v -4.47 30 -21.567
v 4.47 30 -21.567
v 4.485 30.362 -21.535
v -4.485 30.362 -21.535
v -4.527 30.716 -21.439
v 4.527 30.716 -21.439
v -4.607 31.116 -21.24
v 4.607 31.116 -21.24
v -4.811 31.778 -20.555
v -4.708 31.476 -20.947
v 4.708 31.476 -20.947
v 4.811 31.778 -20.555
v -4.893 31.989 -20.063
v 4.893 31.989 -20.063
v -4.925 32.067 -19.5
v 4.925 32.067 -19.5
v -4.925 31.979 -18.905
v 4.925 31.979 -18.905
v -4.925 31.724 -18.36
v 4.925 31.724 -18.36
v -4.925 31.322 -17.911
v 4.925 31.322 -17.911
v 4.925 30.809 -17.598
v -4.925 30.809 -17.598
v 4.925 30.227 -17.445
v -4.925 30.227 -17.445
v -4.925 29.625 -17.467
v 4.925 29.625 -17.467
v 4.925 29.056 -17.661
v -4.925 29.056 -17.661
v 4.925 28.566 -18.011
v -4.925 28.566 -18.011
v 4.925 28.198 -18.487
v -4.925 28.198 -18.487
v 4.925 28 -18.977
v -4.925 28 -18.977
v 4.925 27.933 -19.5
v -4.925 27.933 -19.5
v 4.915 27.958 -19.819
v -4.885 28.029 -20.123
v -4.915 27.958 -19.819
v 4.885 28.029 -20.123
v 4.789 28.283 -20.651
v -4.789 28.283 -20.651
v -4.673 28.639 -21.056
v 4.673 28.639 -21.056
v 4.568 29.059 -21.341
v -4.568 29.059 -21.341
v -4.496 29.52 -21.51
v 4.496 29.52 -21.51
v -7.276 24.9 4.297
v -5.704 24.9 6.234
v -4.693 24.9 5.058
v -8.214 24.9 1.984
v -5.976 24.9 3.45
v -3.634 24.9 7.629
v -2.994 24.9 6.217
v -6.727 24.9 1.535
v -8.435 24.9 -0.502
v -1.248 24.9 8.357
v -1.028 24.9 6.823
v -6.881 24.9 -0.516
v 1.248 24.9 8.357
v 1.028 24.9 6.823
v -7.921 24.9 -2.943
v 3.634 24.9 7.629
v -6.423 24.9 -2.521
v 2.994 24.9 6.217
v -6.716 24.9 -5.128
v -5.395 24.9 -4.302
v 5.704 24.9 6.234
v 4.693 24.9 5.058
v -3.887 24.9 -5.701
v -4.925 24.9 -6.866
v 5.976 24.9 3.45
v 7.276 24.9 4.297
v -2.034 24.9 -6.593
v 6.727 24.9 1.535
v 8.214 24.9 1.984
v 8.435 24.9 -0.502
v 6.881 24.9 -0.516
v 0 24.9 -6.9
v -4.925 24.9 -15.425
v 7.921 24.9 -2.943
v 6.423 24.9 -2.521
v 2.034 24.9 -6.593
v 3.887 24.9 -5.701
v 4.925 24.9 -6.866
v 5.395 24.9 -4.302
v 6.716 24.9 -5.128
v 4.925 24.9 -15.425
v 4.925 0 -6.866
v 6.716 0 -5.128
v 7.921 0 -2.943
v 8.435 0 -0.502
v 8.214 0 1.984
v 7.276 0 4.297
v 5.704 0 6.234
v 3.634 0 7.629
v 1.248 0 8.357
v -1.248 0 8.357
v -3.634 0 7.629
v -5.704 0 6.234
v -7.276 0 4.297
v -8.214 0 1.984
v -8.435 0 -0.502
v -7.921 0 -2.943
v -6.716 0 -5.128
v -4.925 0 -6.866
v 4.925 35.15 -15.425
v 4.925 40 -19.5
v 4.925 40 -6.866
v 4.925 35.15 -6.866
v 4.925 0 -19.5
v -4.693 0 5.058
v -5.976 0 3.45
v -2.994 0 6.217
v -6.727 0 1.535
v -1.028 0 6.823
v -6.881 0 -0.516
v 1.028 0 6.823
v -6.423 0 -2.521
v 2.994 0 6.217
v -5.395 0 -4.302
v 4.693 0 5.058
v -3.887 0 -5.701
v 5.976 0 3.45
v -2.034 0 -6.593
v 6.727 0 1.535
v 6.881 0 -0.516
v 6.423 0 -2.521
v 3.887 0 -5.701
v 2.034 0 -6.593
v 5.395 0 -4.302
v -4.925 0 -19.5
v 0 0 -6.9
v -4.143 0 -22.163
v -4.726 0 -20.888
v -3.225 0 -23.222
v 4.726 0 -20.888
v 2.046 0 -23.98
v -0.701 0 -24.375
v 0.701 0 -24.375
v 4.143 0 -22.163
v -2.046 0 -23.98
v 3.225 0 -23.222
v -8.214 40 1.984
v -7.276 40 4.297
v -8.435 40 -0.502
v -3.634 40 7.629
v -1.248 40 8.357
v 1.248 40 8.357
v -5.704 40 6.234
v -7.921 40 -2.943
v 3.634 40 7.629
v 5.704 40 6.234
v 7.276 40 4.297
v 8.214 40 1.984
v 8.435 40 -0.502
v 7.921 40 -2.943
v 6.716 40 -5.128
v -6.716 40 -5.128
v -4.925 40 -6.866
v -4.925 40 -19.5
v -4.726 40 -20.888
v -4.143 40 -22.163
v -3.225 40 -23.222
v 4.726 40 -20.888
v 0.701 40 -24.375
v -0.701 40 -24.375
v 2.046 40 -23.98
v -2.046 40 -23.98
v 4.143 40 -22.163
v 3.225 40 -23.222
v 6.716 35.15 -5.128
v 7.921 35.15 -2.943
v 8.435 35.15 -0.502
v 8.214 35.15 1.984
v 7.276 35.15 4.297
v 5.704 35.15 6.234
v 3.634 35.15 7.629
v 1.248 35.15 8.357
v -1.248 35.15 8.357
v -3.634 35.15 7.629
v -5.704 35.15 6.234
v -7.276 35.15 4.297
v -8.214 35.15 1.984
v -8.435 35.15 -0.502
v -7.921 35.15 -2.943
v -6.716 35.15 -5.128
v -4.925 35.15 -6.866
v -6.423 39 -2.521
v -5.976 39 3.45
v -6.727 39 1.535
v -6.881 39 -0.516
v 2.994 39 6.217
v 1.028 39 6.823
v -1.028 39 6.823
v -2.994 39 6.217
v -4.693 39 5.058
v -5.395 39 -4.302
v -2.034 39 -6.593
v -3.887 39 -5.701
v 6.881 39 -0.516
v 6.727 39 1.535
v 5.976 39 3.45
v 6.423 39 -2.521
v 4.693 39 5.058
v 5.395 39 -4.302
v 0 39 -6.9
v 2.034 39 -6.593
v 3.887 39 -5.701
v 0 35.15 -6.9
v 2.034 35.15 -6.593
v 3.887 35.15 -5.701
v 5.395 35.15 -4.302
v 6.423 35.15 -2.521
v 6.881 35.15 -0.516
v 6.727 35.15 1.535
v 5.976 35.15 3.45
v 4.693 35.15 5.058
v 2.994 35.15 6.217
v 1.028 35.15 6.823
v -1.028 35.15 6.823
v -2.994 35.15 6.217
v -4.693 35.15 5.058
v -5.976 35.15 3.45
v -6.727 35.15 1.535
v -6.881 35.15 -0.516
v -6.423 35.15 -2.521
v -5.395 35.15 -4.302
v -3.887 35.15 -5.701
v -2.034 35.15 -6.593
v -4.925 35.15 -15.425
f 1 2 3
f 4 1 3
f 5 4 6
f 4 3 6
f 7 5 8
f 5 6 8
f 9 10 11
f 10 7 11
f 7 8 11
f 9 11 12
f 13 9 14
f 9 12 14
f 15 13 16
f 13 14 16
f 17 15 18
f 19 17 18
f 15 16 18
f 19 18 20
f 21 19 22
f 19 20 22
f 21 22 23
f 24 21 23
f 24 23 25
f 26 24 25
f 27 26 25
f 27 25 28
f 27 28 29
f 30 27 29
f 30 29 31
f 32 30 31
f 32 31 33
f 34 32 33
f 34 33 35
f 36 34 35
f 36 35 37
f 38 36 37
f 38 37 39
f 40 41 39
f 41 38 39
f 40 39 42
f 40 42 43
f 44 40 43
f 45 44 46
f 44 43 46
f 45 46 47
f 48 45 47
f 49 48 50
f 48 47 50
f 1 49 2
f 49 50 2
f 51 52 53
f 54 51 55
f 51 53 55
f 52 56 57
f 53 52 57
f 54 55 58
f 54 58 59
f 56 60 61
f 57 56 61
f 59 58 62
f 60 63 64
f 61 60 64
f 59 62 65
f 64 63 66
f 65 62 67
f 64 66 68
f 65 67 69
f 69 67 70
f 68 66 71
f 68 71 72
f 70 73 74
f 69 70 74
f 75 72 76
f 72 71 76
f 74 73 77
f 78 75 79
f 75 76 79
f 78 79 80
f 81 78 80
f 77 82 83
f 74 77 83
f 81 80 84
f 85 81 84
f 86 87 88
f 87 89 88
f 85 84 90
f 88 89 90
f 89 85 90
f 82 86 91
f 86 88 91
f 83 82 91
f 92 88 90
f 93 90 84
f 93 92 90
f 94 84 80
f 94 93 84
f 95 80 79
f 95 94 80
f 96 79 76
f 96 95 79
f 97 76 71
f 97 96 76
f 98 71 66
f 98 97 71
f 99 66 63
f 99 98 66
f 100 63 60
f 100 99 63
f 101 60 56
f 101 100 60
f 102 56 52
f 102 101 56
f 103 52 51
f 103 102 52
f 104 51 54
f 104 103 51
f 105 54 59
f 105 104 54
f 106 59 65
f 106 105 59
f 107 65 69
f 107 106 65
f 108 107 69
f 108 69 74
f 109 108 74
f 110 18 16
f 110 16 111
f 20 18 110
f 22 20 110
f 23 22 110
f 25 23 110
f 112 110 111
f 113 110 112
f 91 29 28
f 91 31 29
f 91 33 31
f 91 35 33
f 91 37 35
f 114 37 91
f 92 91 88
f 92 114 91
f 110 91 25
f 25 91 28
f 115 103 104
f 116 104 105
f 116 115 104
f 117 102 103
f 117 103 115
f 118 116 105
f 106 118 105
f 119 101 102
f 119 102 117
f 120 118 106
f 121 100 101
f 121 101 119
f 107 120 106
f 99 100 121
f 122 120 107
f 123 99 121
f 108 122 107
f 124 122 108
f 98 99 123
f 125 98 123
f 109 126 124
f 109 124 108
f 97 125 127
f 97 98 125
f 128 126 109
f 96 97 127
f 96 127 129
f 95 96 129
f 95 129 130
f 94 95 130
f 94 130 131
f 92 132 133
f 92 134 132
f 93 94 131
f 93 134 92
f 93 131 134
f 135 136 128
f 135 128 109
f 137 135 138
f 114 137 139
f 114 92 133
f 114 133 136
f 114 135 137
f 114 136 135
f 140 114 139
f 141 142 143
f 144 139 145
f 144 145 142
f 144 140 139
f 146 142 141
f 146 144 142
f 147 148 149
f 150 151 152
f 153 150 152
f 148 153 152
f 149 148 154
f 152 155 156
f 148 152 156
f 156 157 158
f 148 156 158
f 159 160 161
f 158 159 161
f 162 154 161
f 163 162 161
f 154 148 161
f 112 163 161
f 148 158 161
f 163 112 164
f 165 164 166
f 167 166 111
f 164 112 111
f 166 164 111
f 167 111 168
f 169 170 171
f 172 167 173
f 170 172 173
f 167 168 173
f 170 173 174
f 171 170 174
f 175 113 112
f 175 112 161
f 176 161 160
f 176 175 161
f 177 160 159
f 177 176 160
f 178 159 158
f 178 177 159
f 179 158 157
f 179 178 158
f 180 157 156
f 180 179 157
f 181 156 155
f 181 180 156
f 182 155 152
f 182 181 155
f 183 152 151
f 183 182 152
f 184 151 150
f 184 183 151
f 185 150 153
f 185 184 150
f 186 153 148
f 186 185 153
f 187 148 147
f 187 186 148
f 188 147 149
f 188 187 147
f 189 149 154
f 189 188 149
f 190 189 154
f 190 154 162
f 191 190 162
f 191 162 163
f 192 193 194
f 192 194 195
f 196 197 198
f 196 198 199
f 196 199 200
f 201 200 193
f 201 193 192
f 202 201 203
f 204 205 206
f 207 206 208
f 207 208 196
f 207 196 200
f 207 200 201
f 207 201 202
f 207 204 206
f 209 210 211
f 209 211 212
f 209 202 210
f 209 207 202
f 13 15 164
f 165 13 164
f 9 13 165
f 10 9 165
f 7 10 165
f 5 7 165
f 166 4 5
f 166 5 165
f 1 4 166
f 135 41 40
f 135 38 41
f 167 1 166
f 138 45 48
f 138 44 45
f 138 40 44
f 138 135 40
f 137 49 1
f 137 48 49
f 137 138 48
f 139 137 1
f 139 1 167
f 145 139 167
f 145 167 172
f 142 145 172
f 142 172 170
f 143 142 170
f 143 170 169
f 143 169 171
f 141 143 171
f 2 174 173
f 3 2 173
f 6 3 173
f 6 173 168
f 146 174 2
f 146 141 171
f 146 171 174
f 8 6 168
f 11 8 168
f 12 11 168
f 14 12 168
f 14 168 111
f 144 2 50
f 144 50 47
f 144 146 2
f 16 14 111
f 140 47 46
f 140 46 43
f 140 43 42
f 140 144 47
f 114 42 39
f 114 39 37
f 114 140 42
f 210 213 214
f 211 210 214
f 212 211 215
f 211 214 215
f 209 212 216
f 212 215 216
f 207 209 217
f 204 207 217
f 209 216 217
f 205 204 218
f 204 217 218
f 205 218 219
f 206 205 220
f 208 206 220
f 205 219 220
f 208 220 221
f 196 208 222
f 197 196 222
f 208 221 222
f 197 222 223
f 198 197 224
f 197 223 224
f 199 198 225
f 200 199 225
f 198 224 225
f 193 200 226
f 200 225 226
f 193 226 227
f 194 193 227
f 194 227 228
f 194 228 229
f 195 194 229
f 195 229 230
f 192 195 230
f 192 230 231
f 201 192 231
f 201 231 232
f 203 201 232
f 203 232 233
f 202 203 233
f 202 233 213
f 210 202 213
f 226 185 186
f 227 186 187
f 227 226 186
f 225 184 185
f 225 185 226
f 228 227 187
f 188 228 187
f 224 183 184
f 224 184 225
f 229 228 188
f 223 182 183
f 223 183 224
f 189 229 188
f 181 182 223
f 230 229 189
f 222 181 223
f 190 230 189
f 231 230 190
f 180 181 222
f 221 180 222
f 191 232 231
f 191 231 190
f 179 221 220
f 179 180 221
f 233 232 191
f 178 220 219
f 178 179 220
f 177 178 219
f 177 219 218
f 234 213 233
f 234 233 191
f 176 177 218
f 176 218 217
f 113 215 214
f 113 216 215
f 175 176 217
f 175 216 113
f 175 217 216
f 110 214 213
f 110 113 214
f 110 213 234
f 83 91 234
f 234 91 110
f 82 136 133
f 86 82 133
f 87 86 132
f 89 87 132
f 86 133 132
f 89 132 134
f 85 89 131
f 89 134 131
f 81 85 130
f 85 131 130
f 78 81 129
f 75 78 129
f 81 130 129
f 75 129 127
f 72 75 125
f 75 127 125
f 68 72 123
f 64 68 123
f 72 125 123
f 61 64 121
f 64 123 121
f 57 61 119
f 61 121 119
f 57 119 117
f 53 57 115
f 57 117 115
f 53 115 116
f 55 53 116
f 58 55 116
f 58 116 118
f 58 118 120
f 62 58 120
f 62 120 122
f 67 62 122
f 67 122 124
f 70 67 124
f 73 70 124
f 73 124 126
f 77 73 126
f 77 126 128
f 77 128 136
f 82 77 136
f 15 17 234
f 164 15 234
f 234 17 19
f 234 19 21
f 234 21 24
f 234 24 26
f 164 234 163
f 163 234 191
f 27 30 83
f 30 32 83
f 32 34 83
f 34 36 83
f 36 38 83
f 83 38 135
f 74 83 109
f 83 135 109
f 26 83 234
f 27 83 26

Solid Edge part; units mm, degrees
sketch "Sketch1" plane through (0, 0, 0) normal (0, -1, 0) x (1, 0, 0)
  line L0 (4.925, -19.5) -> (4.925, -6.8664)
  line L1 (-4.925, -19.5) -> (-4.925, -6.8664)
  arc A0 (-4.925, -19.5) -> (4.925, -19.5) centre (0, -19.5) ccw
  arc A1 (4.925, -6.8664) -> (-4.925, -6.8664) centre (0, 0) ccw
extrude "Protrusion1" add sketch "Sketch1" against normal blind 40
sketch "Sketch2" plane through (0, 0, -7.9875) normal (0, -1, 0) x (0, 0, -1)
  circle A0 centre (-7.9875, 0) radius 6.9
  dimension "D1" = 13.8
extrude "Ausschnitt_1" cut sketch "Sketch2" against normal blind 39
sketch "Sketch3" plane through (0, 0, 0) normal (1, 0, 0) x (0, 1, 0)
  line L0 (35.15, 8.45) -> (24.9, 8.45)
  line L1 (24.9, 8.45) -> (24.9, -15.425)
  line L2 (24.9, -15.425) -> (35.15, -15.425)
  line L3 (35.15, 8.45) -> (35.15, -15.425)
  dimension "D1" = 9
  dimension "D2" = 10.25
  dimension "D3" = 4.85
extrude "Cutout1" cut sketch "Sketch3" against normal through all and the other way through all
hole "Bohrung_1" at (4.925, 30, -19.5) direction (1, 0, 0) diameter 4.134 end through all both ways yes thread major 5 thread length 2
